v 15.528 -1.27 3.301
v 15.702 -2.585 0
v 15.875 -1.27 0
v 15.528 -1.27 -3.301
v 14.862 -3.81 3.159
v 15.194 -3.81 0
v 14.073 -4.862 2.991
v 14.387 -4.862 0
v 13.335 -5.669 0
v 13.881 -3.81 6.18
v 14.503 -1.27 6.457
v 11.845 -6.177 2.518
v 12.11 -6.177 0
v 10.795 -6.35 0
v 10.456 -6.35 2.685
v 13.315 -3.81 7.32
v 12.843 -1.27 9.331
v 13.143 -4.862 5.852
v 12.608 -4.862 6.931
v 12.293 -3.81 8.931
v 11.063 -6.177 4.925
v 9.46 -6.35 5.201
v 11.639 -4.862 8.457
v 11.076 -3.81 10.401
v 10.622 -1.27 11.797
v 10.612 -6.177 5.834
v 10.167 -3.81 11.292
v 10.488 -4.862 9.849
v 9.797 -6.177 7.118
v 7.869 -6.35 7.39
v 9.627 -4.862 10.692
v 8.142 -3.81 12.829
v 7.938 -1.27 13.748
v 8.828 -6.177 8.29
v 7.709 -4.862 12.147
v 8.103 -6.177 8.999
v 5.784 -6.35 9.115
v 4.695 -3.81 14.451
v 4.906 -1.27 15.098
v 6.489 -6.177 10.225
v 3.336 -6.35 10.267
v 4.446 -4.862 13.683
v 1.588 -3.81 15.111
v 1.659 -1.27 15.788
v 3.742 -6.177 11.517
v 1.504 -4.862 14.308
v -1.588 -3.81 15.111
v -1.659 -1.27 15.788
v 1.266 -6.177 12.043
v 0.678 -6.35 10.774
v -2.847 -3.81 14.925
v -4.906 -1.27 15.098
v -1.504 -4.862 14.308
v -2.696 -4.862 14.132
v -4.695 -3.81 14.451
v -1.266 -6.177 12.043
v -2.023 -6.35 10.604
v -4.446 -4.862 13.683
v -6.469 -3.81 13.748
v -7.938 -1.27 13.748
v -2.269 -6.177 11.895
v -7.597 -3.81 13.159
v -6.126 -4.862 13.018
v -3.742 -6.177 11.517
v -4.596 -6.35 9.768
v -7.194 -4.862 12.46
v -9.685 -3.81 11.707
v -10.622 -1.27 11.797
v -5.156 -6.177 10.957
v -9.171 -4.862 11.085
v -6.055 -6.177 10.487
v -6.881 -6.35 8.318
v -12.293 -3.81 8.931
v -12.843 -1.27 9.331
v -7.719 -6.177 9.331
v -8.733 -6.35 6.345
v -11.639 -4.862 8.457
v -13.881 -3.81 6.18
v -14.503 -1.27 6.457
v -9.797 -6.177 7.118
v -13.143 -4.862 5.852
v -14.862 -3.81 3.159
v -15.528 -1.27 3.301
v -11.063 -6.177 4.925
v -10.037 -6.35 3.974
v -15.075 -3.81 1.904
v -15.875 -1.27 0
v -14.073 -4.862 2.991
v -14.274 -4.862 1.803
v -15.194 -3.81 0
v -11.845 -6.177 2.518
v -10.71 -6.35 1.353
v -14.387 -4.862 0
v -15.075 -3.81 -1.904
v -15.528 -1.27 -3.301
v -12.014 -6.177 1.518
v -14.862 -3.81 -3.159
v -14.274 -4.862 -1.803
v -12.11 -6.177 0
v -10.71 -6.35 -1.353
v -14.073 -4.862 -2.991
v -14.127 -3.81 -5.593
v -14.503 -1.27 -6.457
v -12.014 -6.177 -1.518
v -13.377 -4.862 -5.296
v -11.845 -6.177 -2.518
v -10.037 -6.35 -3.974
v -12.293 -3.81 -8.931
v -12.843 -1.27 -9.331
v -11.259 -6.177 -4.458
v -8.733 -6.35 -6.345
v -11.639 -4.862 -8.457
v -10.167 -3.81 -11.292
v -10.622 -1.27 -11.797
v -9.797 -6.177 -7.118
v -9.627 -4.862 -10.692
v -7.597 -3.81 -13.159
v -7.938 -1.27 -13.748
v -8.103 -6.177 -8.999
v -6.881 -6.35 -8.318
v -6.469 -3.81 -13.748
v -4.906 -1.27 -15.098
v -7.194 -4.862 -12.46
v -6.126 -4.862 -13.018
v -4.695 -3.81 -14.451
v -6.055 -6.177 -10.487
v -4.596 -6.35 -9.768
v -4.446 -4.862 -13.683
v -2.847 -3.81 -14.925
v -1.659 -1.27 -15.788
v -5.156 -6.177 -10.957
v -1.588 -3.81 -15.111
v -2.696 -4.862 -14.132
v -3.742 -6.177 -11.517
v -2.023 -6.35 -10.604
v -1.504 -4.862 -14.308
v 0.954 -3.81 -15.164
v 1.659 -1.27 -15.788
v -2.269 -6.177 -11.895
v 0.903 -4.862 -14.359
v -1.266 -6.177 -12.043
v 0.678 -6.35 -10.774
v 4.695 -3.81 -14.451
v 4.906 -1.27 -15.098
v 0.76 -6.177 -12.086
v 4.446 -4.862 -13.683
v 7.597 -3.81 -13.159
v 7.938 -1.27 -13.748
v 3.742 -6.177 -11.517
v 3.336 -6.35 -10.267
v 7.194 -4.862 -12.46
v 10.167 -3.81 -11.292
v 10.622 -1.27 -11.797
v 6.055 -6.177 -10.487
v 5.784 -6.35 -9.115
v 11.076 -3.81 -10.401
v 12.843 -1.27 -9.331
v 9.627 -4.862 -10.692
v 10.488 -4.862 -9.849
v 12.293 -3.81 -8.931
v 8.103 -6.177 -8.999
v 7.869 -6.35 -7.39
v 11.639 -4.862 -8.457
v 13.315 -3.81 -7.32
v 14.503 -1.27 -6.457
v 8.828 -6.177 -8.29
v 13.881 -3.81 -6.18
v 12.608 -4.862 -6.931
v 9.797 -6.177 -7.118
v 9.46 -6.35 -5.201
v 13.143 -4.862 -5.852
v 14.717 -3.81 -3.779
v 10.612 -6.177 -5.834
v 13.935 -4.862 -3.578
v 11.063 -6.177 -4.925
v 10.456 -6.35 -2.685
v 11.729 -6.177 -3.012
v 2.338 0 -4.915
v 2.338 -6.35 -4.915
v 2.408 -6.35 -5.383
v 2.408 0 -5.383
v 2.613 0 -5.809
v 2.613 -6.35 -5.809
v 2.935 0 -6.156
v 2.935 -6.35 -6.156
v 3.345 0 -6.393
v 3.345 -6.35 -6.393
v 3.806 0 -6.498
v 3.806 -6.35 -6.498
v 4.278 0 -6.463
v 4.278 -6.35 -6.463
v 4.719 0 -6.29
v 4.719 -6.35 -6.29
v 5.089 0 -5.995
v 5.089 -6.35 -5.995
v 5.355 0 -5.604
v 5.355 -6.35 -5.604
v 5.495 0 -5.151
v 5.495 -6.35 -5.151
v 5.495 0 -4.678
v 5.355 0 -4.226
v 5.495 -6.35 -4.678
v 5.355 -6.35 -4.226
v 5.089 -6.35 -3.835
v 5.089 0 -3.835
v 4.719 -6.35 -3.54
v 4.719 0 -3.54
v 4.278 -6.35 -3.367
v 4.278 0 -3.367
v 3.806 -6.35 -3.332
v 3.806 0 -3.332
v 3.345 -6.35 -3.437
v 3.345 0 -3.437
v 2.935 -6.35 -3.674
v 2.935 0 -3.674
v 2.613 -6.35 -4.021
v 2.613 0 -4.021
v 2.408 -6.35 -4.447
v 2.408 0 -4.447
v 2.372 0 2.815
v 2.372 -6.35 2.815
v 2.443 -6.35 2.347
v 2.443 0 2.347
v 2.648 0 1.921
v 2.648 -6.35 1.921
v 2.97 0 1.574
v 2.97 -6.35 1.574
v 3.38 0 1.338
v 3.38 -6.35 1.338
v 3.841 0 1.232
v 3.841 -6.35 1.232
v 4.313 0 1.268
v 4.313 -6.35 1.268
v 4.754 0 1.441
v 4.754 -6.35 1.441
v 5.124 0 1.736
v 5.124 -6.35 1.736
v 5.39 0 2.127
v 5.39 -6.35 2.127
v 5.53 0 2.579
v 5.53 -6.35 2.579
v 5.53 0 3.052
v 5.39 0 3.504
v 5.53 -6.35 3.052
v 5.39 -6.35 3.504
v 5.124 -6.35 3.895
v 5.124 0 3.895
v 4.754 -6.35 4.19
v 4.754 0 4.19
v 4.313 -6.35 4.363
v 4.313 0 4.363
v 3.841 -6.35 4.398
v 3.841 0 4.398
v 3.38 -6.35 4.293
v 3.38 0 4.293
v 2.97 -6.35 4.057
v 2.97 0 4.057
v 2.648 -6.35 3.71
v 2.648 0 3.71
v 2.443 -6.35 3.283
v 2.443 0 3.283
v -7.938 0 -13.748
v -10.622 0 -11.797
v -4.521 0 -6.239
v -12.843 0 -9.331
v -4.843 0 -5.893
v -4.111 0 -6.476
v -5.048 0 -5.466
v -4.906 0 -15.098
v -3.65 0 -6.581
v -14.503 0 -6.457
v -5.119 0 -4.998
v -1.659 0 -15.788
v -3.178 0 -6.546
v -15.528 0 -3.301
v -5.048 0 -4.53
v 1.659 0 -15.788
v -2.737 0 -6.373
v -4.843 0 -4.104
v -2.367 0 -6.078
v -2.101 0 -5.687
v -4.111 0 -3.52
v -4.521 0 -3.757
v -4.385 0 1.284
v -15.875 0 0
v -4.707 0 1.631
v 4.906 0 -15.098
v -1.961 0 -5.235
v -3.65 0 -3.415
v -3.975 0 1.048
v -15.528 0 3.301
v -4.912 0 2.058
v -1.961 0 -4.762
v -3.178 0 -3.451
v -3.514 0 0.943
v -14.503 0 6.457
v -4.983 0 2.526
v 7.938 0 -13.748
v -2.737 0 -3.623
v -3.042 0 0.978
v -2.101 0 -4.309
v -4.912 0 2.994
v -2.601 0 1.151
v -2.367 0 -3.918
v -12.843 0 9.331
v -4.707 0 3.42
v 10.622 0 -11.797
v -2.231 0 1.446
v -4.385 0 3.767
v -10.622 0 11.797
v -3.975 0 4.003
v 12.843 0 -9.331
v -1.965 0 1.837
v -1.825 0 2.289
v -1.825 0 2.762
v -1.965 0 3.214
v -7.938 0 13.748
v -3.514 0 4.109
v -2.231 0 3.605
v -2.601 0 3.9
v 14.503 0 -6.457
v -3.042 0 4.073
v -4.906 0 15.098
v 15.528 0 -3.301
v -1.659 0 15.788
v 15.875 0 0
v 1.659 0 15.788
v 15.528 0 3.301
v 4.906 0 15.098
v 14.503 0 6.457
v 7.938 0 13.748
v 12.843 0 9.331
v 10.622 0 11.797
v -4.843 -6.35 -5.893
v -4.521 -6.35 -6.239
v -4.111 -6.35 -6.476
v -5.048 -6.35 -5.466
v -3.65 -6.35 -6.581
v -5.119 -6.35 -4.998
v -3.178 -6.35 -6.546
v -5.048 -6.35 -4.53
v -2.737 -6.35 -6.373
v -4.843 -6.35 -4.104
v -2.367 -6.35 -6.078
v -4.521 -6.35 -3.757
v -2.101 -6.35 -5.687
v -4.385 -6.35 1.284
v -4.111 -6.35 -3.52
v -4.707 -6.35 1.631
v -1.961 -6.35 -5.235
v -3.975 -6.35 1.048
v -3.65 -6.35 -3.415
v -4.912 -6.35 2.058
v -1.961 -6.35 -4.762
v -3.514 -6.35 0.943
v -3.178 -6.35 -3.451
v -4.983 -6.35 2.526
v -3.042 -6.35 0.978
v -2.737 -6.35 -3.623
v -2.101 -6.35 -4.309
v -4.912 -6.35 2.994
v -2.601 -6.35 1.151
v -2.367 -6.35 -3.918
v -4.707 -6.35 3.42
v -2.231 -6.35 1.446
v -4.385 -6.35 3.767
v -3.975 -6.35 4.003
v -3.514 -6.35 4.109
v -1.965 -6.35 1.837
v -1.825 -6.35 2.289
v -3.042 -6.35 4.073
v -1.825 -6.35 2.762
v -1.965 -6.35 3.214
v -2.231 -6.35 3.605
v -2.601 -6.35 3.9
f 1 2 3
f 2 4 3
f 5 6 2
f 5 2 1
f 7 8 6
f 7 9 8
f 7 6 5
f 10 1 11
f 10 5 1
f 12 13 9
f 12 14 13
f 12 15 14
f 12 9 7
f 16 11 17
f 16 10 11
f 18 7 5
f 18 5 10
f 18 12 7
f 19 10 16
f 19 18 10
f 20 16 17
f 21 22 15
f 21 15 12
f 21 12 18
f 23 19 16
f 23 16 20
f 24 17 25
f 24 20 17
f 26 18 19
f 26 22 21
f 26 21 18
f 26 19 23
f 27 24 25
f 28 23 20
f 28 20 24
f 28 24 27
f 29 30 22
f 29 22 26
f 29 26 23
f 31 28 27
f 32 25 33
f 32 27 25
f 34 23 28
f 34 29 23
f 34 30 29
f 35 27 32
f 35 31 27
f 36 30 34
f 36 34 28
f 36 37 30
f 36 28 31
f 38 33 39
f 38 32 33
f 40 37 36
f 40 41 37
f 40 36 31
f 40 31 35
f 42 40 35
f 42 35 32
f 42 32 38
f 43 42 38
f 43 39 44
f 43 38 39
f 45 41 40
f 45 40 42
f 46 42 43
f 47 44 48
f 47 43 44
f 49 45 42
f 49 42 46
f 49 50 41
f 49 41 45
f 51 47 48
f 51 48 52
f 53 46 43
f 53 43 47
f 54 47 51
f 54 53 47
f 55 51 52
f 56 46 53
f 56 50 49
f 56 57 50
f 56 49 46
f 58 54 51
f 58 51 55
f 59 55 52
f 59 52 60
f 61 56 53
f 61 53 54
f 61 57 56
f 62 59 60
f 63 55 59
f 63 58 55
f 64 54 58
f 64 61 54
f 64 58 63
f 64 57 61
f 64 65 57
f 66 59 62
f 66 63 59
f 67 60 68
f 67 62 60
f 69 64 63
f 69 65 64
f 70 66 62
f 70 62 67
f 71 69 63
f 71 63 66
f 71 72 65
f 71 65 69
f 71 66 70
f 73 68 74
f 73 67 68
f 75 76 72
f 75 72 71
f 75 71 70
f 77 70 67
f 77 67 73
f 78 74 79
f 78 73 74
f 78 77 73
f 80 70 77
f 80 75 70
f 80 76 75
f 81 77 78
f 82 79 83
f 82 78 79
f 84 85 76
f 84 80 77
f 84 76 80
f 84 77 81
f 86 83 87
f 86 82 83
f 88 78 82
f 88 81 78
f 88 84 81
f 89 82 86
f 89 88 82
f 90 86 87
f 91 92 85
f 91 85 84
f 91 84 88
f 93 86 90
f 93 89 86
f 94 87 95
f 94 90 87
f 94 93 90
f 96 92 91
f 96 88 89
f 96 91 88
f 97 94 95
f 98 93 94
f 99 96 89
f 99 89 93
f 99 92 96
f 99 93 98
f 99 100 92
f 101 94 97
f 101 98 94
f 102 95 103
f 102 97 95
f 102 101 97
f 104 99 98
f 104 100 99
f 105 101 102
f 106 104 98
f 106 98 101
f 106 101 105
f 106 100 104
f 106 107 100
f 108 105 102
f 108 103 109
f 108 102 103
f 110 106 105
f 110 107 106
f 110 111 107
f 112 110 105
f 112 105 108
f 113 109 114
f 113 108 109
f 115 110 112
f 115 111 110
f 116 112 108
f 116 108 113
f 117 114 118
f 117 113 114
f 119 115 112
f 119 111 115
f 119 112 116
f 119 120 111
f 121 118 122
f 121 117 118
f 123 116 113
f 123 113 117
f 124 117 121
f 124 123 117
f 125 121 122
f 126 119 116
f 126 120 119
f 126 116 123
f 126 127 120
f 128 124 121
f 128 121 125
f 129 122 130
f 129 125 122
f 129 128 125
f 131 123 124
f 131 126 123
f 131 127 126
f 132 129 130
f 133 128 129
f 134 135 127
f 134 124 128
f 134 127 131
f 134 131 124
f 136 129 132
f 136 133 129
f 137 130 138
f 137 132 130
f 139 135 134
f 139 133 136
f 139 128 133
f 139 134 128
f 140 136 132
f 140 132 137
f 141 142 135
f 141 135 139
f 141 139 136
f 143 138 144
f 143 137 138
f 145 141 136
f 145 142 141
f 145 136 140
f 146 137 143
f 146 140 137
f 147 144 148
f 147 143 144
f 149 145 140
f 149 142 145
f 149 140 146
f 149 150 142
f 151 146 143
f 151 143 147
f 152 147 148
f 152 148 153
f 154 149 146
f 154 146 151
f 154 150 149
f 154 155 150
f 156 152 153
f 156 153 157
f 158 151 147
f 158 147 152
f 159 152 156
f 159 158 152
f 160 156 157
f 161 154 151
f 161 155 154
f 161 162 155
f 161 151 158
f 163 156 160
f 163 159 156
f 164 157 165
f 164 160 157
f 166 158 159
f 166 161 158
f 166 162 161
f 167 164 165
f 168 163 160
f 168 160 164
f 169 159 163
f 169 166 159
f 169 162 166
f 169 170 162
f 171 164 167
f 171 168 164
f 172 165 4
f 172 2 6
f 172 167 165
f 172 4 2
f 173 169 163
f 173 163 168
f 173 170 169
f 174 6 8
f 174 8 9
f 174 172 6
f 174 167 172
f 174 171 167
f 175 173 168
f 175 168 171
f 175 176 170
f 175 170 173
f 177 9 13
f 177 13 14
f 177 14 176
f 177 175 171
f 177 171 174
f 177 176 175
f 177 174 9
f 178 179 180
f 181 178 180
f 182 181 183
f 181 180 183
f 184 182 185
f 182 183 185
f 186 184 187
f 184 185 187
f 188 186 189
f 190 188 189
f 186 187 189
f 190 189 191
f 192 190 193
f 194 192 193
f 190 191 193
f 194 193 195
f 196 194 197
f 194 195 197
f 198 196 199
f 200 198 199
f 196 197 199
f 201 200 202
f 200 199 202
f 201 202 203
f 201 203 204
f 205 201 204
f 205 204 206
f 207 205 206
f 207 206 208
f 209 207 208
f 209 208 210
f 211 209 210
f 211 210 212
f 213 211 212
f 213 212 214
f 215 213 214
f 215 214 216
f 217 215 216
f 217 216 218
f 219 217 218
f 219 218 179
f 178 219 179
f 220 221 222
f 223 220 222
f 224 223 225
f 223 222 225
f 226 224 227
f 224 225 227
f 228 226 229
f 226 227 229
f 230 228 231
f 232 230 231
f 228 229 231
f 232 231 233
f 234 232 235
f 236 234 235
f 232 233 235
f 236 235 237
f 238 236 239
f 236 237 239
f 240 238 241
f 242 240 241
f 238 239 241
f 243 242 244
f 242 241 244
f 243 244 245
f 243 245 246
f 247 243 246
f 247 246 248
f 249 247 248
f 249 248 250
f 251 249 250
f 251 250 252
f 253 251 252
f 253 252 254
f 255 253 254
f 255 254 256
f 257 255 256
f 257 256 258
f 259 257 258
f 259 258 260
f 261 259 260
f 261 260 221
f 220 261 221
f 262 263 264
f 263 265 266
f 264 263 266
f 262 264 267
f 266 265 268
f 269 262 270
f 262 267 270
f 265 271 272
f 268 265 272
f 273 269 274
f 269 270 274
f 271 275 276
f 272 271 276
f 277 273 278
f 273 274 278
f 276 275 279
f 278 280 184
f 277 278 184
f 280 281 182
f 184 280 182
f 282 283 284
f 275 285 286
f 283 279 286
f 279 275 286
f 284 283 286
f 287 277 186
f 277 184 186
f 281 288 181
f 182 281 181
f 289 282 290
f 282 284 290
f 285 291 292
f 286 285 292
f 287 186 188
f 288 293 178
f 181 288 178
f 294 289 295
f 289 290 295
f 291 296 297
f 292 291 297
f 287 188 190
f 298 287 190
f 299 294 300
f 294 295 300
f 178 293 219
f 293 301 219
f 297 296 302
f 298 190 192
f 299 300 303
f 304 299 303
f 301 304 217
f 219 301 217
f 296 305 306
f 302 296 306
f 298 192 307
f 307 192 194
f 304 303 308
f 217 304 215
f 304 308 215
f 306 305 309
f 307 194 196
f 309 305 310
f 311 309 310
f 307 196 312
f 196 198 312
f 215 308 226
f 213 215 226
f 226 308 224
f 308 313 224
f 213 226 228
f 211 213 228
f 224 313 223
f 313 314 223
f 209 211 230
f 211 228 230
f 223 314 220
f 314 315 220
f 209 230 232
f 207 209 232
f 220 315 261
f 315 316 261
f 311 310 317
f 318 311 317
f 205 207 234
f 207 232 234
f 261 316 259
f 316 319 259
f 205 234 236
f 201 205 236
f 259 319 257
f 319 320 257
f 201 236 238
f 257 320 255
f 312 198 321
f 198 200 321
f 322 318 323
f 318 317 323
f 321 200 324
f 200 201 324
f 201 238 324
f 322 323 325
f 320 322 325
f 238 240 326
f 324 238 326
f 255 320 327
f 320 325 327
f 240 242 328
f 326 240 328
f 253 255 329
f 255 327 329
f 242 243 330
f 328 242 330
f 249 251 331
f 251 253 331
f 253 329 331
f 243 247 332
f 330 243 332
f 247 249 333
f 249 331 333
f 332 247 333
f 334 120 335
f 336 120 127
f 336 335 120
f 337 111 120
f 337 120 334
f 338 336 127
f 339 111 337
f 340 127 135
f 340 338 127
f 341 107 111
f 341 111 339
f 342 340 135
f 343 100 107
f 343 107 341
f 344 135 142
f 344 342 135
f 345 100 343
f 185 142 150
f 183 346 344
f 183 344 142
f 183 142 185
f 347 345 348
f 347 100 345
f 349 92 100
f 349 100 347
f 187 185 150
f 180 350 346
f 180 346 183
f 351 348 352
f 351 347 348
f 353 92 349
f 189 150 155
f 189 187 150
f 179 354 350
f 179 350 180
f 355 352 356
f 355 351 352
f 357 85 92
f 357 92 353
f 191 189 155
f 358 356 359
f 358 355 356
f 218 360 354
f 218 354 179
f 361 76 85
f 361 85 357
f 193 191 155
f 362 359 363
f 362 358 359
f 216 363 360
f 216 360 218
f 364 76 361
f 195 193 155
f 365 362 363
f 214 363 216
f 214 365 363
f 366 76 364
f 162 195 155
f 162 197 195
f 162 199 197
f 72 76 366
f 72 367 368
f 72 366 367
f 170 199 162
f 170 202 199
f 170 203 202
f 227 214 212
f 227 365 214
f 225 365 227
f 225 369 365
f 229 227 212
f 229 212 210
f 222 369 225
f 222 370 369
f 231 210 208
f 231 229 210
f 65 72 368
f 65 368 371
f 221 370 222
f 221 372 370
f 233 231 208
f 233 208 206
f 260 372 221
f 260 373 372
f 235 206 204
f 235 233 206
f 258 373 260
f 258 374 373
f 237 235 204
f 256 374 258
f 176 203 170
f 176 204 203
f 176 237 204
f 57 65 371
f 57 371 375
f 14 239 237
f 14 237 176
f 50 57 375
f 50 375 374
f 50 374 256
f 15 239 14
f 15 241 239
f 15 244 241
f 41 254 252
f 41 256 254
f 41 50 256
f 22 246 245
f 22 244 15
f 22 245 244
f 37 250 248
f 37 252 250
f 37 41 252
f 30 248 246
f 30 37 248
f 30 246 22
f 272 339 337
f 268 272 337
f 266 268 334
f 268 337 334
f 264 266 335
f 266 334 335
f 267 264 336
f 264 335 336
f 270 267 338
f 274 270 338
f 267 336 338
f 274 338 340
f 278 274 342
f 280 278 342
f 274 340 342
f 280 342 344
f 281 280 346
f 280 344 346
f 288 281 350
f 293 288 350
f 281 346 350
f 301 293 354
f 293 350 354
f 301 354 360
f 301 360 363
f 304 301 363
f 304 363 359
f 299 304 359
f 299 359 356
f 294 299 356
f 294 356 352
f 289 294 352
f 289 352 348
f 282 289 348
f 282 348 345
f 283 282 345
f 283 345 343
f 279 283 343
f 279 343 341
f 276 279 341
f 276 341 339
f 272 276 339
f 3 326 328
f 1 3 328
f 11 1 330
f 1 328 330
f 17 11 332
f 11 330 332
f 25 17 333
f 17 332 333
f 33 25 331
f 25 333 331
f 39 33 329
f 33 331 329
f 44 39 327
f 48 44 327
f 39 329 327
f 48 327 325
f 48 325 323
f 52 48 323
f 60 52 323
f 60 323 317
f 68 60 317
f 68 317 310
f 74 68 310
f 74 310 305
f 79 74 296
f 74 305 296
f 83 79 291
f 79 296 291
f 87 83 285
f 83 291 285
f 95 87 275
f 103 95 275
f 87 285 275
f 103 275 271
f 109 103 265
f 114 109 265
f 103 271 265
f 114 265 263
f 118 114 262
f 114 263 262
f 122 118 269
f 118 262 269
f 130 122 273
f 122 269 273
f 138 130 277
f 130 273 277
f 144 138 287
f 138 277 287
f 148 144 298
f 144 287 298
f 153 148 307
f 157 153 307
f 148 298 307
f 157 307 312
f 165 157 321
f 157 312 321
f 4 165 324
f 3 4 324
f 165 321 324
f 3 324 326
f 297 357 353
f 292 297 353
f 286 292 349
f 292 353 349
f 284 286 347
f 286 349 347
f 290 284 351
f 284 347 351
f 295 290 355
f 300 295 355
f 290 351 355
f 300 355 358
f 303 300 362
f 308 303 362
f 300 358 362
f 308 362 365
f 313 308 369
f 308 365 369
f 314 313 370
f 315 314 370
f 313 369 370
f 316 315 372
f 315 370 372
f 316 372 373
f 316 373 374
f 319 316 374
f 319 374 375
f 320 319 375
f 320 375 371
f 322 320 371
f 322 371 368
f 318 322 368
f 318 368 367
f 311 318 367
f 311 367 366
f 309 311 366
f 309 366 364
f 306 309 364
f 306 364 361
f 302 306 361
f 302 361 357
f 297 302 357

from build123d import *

# Parameters (mm, degrees)
F0_R     = 15.875
F2_DEPTH = 6.35
F3_D     = 3.175
F4_R     = 5.08


with BuildPart() as f2:
    # F0 (on Front) → F2 (new body)
    with BuildSketch(Plane.XZ):
        Circle(F0_R)
    extrude(amount=F2_DEPTH)

    # F3 (through all)
    with Locations(Plane(origin=(0, 0, 0), x_dir=(1, 0, 0), z_dir=(0, 1, 0))):
        with Locations((3.9598953958, -2.8153994276), (-3.3950347352, -2.5255896296), (-3.5310642417, 4.9982398479), (3.925069736, 4.9148391505)):
            Hole(F3_D / 2)

    # F4
    f4_edges = [f2.edges().sort_by_distance(p)[0] for p in [
        (-15.875, -6.35, 0),
    ]]
    fillet(f4_edges, radius=F4_R)


solid = f2.part
